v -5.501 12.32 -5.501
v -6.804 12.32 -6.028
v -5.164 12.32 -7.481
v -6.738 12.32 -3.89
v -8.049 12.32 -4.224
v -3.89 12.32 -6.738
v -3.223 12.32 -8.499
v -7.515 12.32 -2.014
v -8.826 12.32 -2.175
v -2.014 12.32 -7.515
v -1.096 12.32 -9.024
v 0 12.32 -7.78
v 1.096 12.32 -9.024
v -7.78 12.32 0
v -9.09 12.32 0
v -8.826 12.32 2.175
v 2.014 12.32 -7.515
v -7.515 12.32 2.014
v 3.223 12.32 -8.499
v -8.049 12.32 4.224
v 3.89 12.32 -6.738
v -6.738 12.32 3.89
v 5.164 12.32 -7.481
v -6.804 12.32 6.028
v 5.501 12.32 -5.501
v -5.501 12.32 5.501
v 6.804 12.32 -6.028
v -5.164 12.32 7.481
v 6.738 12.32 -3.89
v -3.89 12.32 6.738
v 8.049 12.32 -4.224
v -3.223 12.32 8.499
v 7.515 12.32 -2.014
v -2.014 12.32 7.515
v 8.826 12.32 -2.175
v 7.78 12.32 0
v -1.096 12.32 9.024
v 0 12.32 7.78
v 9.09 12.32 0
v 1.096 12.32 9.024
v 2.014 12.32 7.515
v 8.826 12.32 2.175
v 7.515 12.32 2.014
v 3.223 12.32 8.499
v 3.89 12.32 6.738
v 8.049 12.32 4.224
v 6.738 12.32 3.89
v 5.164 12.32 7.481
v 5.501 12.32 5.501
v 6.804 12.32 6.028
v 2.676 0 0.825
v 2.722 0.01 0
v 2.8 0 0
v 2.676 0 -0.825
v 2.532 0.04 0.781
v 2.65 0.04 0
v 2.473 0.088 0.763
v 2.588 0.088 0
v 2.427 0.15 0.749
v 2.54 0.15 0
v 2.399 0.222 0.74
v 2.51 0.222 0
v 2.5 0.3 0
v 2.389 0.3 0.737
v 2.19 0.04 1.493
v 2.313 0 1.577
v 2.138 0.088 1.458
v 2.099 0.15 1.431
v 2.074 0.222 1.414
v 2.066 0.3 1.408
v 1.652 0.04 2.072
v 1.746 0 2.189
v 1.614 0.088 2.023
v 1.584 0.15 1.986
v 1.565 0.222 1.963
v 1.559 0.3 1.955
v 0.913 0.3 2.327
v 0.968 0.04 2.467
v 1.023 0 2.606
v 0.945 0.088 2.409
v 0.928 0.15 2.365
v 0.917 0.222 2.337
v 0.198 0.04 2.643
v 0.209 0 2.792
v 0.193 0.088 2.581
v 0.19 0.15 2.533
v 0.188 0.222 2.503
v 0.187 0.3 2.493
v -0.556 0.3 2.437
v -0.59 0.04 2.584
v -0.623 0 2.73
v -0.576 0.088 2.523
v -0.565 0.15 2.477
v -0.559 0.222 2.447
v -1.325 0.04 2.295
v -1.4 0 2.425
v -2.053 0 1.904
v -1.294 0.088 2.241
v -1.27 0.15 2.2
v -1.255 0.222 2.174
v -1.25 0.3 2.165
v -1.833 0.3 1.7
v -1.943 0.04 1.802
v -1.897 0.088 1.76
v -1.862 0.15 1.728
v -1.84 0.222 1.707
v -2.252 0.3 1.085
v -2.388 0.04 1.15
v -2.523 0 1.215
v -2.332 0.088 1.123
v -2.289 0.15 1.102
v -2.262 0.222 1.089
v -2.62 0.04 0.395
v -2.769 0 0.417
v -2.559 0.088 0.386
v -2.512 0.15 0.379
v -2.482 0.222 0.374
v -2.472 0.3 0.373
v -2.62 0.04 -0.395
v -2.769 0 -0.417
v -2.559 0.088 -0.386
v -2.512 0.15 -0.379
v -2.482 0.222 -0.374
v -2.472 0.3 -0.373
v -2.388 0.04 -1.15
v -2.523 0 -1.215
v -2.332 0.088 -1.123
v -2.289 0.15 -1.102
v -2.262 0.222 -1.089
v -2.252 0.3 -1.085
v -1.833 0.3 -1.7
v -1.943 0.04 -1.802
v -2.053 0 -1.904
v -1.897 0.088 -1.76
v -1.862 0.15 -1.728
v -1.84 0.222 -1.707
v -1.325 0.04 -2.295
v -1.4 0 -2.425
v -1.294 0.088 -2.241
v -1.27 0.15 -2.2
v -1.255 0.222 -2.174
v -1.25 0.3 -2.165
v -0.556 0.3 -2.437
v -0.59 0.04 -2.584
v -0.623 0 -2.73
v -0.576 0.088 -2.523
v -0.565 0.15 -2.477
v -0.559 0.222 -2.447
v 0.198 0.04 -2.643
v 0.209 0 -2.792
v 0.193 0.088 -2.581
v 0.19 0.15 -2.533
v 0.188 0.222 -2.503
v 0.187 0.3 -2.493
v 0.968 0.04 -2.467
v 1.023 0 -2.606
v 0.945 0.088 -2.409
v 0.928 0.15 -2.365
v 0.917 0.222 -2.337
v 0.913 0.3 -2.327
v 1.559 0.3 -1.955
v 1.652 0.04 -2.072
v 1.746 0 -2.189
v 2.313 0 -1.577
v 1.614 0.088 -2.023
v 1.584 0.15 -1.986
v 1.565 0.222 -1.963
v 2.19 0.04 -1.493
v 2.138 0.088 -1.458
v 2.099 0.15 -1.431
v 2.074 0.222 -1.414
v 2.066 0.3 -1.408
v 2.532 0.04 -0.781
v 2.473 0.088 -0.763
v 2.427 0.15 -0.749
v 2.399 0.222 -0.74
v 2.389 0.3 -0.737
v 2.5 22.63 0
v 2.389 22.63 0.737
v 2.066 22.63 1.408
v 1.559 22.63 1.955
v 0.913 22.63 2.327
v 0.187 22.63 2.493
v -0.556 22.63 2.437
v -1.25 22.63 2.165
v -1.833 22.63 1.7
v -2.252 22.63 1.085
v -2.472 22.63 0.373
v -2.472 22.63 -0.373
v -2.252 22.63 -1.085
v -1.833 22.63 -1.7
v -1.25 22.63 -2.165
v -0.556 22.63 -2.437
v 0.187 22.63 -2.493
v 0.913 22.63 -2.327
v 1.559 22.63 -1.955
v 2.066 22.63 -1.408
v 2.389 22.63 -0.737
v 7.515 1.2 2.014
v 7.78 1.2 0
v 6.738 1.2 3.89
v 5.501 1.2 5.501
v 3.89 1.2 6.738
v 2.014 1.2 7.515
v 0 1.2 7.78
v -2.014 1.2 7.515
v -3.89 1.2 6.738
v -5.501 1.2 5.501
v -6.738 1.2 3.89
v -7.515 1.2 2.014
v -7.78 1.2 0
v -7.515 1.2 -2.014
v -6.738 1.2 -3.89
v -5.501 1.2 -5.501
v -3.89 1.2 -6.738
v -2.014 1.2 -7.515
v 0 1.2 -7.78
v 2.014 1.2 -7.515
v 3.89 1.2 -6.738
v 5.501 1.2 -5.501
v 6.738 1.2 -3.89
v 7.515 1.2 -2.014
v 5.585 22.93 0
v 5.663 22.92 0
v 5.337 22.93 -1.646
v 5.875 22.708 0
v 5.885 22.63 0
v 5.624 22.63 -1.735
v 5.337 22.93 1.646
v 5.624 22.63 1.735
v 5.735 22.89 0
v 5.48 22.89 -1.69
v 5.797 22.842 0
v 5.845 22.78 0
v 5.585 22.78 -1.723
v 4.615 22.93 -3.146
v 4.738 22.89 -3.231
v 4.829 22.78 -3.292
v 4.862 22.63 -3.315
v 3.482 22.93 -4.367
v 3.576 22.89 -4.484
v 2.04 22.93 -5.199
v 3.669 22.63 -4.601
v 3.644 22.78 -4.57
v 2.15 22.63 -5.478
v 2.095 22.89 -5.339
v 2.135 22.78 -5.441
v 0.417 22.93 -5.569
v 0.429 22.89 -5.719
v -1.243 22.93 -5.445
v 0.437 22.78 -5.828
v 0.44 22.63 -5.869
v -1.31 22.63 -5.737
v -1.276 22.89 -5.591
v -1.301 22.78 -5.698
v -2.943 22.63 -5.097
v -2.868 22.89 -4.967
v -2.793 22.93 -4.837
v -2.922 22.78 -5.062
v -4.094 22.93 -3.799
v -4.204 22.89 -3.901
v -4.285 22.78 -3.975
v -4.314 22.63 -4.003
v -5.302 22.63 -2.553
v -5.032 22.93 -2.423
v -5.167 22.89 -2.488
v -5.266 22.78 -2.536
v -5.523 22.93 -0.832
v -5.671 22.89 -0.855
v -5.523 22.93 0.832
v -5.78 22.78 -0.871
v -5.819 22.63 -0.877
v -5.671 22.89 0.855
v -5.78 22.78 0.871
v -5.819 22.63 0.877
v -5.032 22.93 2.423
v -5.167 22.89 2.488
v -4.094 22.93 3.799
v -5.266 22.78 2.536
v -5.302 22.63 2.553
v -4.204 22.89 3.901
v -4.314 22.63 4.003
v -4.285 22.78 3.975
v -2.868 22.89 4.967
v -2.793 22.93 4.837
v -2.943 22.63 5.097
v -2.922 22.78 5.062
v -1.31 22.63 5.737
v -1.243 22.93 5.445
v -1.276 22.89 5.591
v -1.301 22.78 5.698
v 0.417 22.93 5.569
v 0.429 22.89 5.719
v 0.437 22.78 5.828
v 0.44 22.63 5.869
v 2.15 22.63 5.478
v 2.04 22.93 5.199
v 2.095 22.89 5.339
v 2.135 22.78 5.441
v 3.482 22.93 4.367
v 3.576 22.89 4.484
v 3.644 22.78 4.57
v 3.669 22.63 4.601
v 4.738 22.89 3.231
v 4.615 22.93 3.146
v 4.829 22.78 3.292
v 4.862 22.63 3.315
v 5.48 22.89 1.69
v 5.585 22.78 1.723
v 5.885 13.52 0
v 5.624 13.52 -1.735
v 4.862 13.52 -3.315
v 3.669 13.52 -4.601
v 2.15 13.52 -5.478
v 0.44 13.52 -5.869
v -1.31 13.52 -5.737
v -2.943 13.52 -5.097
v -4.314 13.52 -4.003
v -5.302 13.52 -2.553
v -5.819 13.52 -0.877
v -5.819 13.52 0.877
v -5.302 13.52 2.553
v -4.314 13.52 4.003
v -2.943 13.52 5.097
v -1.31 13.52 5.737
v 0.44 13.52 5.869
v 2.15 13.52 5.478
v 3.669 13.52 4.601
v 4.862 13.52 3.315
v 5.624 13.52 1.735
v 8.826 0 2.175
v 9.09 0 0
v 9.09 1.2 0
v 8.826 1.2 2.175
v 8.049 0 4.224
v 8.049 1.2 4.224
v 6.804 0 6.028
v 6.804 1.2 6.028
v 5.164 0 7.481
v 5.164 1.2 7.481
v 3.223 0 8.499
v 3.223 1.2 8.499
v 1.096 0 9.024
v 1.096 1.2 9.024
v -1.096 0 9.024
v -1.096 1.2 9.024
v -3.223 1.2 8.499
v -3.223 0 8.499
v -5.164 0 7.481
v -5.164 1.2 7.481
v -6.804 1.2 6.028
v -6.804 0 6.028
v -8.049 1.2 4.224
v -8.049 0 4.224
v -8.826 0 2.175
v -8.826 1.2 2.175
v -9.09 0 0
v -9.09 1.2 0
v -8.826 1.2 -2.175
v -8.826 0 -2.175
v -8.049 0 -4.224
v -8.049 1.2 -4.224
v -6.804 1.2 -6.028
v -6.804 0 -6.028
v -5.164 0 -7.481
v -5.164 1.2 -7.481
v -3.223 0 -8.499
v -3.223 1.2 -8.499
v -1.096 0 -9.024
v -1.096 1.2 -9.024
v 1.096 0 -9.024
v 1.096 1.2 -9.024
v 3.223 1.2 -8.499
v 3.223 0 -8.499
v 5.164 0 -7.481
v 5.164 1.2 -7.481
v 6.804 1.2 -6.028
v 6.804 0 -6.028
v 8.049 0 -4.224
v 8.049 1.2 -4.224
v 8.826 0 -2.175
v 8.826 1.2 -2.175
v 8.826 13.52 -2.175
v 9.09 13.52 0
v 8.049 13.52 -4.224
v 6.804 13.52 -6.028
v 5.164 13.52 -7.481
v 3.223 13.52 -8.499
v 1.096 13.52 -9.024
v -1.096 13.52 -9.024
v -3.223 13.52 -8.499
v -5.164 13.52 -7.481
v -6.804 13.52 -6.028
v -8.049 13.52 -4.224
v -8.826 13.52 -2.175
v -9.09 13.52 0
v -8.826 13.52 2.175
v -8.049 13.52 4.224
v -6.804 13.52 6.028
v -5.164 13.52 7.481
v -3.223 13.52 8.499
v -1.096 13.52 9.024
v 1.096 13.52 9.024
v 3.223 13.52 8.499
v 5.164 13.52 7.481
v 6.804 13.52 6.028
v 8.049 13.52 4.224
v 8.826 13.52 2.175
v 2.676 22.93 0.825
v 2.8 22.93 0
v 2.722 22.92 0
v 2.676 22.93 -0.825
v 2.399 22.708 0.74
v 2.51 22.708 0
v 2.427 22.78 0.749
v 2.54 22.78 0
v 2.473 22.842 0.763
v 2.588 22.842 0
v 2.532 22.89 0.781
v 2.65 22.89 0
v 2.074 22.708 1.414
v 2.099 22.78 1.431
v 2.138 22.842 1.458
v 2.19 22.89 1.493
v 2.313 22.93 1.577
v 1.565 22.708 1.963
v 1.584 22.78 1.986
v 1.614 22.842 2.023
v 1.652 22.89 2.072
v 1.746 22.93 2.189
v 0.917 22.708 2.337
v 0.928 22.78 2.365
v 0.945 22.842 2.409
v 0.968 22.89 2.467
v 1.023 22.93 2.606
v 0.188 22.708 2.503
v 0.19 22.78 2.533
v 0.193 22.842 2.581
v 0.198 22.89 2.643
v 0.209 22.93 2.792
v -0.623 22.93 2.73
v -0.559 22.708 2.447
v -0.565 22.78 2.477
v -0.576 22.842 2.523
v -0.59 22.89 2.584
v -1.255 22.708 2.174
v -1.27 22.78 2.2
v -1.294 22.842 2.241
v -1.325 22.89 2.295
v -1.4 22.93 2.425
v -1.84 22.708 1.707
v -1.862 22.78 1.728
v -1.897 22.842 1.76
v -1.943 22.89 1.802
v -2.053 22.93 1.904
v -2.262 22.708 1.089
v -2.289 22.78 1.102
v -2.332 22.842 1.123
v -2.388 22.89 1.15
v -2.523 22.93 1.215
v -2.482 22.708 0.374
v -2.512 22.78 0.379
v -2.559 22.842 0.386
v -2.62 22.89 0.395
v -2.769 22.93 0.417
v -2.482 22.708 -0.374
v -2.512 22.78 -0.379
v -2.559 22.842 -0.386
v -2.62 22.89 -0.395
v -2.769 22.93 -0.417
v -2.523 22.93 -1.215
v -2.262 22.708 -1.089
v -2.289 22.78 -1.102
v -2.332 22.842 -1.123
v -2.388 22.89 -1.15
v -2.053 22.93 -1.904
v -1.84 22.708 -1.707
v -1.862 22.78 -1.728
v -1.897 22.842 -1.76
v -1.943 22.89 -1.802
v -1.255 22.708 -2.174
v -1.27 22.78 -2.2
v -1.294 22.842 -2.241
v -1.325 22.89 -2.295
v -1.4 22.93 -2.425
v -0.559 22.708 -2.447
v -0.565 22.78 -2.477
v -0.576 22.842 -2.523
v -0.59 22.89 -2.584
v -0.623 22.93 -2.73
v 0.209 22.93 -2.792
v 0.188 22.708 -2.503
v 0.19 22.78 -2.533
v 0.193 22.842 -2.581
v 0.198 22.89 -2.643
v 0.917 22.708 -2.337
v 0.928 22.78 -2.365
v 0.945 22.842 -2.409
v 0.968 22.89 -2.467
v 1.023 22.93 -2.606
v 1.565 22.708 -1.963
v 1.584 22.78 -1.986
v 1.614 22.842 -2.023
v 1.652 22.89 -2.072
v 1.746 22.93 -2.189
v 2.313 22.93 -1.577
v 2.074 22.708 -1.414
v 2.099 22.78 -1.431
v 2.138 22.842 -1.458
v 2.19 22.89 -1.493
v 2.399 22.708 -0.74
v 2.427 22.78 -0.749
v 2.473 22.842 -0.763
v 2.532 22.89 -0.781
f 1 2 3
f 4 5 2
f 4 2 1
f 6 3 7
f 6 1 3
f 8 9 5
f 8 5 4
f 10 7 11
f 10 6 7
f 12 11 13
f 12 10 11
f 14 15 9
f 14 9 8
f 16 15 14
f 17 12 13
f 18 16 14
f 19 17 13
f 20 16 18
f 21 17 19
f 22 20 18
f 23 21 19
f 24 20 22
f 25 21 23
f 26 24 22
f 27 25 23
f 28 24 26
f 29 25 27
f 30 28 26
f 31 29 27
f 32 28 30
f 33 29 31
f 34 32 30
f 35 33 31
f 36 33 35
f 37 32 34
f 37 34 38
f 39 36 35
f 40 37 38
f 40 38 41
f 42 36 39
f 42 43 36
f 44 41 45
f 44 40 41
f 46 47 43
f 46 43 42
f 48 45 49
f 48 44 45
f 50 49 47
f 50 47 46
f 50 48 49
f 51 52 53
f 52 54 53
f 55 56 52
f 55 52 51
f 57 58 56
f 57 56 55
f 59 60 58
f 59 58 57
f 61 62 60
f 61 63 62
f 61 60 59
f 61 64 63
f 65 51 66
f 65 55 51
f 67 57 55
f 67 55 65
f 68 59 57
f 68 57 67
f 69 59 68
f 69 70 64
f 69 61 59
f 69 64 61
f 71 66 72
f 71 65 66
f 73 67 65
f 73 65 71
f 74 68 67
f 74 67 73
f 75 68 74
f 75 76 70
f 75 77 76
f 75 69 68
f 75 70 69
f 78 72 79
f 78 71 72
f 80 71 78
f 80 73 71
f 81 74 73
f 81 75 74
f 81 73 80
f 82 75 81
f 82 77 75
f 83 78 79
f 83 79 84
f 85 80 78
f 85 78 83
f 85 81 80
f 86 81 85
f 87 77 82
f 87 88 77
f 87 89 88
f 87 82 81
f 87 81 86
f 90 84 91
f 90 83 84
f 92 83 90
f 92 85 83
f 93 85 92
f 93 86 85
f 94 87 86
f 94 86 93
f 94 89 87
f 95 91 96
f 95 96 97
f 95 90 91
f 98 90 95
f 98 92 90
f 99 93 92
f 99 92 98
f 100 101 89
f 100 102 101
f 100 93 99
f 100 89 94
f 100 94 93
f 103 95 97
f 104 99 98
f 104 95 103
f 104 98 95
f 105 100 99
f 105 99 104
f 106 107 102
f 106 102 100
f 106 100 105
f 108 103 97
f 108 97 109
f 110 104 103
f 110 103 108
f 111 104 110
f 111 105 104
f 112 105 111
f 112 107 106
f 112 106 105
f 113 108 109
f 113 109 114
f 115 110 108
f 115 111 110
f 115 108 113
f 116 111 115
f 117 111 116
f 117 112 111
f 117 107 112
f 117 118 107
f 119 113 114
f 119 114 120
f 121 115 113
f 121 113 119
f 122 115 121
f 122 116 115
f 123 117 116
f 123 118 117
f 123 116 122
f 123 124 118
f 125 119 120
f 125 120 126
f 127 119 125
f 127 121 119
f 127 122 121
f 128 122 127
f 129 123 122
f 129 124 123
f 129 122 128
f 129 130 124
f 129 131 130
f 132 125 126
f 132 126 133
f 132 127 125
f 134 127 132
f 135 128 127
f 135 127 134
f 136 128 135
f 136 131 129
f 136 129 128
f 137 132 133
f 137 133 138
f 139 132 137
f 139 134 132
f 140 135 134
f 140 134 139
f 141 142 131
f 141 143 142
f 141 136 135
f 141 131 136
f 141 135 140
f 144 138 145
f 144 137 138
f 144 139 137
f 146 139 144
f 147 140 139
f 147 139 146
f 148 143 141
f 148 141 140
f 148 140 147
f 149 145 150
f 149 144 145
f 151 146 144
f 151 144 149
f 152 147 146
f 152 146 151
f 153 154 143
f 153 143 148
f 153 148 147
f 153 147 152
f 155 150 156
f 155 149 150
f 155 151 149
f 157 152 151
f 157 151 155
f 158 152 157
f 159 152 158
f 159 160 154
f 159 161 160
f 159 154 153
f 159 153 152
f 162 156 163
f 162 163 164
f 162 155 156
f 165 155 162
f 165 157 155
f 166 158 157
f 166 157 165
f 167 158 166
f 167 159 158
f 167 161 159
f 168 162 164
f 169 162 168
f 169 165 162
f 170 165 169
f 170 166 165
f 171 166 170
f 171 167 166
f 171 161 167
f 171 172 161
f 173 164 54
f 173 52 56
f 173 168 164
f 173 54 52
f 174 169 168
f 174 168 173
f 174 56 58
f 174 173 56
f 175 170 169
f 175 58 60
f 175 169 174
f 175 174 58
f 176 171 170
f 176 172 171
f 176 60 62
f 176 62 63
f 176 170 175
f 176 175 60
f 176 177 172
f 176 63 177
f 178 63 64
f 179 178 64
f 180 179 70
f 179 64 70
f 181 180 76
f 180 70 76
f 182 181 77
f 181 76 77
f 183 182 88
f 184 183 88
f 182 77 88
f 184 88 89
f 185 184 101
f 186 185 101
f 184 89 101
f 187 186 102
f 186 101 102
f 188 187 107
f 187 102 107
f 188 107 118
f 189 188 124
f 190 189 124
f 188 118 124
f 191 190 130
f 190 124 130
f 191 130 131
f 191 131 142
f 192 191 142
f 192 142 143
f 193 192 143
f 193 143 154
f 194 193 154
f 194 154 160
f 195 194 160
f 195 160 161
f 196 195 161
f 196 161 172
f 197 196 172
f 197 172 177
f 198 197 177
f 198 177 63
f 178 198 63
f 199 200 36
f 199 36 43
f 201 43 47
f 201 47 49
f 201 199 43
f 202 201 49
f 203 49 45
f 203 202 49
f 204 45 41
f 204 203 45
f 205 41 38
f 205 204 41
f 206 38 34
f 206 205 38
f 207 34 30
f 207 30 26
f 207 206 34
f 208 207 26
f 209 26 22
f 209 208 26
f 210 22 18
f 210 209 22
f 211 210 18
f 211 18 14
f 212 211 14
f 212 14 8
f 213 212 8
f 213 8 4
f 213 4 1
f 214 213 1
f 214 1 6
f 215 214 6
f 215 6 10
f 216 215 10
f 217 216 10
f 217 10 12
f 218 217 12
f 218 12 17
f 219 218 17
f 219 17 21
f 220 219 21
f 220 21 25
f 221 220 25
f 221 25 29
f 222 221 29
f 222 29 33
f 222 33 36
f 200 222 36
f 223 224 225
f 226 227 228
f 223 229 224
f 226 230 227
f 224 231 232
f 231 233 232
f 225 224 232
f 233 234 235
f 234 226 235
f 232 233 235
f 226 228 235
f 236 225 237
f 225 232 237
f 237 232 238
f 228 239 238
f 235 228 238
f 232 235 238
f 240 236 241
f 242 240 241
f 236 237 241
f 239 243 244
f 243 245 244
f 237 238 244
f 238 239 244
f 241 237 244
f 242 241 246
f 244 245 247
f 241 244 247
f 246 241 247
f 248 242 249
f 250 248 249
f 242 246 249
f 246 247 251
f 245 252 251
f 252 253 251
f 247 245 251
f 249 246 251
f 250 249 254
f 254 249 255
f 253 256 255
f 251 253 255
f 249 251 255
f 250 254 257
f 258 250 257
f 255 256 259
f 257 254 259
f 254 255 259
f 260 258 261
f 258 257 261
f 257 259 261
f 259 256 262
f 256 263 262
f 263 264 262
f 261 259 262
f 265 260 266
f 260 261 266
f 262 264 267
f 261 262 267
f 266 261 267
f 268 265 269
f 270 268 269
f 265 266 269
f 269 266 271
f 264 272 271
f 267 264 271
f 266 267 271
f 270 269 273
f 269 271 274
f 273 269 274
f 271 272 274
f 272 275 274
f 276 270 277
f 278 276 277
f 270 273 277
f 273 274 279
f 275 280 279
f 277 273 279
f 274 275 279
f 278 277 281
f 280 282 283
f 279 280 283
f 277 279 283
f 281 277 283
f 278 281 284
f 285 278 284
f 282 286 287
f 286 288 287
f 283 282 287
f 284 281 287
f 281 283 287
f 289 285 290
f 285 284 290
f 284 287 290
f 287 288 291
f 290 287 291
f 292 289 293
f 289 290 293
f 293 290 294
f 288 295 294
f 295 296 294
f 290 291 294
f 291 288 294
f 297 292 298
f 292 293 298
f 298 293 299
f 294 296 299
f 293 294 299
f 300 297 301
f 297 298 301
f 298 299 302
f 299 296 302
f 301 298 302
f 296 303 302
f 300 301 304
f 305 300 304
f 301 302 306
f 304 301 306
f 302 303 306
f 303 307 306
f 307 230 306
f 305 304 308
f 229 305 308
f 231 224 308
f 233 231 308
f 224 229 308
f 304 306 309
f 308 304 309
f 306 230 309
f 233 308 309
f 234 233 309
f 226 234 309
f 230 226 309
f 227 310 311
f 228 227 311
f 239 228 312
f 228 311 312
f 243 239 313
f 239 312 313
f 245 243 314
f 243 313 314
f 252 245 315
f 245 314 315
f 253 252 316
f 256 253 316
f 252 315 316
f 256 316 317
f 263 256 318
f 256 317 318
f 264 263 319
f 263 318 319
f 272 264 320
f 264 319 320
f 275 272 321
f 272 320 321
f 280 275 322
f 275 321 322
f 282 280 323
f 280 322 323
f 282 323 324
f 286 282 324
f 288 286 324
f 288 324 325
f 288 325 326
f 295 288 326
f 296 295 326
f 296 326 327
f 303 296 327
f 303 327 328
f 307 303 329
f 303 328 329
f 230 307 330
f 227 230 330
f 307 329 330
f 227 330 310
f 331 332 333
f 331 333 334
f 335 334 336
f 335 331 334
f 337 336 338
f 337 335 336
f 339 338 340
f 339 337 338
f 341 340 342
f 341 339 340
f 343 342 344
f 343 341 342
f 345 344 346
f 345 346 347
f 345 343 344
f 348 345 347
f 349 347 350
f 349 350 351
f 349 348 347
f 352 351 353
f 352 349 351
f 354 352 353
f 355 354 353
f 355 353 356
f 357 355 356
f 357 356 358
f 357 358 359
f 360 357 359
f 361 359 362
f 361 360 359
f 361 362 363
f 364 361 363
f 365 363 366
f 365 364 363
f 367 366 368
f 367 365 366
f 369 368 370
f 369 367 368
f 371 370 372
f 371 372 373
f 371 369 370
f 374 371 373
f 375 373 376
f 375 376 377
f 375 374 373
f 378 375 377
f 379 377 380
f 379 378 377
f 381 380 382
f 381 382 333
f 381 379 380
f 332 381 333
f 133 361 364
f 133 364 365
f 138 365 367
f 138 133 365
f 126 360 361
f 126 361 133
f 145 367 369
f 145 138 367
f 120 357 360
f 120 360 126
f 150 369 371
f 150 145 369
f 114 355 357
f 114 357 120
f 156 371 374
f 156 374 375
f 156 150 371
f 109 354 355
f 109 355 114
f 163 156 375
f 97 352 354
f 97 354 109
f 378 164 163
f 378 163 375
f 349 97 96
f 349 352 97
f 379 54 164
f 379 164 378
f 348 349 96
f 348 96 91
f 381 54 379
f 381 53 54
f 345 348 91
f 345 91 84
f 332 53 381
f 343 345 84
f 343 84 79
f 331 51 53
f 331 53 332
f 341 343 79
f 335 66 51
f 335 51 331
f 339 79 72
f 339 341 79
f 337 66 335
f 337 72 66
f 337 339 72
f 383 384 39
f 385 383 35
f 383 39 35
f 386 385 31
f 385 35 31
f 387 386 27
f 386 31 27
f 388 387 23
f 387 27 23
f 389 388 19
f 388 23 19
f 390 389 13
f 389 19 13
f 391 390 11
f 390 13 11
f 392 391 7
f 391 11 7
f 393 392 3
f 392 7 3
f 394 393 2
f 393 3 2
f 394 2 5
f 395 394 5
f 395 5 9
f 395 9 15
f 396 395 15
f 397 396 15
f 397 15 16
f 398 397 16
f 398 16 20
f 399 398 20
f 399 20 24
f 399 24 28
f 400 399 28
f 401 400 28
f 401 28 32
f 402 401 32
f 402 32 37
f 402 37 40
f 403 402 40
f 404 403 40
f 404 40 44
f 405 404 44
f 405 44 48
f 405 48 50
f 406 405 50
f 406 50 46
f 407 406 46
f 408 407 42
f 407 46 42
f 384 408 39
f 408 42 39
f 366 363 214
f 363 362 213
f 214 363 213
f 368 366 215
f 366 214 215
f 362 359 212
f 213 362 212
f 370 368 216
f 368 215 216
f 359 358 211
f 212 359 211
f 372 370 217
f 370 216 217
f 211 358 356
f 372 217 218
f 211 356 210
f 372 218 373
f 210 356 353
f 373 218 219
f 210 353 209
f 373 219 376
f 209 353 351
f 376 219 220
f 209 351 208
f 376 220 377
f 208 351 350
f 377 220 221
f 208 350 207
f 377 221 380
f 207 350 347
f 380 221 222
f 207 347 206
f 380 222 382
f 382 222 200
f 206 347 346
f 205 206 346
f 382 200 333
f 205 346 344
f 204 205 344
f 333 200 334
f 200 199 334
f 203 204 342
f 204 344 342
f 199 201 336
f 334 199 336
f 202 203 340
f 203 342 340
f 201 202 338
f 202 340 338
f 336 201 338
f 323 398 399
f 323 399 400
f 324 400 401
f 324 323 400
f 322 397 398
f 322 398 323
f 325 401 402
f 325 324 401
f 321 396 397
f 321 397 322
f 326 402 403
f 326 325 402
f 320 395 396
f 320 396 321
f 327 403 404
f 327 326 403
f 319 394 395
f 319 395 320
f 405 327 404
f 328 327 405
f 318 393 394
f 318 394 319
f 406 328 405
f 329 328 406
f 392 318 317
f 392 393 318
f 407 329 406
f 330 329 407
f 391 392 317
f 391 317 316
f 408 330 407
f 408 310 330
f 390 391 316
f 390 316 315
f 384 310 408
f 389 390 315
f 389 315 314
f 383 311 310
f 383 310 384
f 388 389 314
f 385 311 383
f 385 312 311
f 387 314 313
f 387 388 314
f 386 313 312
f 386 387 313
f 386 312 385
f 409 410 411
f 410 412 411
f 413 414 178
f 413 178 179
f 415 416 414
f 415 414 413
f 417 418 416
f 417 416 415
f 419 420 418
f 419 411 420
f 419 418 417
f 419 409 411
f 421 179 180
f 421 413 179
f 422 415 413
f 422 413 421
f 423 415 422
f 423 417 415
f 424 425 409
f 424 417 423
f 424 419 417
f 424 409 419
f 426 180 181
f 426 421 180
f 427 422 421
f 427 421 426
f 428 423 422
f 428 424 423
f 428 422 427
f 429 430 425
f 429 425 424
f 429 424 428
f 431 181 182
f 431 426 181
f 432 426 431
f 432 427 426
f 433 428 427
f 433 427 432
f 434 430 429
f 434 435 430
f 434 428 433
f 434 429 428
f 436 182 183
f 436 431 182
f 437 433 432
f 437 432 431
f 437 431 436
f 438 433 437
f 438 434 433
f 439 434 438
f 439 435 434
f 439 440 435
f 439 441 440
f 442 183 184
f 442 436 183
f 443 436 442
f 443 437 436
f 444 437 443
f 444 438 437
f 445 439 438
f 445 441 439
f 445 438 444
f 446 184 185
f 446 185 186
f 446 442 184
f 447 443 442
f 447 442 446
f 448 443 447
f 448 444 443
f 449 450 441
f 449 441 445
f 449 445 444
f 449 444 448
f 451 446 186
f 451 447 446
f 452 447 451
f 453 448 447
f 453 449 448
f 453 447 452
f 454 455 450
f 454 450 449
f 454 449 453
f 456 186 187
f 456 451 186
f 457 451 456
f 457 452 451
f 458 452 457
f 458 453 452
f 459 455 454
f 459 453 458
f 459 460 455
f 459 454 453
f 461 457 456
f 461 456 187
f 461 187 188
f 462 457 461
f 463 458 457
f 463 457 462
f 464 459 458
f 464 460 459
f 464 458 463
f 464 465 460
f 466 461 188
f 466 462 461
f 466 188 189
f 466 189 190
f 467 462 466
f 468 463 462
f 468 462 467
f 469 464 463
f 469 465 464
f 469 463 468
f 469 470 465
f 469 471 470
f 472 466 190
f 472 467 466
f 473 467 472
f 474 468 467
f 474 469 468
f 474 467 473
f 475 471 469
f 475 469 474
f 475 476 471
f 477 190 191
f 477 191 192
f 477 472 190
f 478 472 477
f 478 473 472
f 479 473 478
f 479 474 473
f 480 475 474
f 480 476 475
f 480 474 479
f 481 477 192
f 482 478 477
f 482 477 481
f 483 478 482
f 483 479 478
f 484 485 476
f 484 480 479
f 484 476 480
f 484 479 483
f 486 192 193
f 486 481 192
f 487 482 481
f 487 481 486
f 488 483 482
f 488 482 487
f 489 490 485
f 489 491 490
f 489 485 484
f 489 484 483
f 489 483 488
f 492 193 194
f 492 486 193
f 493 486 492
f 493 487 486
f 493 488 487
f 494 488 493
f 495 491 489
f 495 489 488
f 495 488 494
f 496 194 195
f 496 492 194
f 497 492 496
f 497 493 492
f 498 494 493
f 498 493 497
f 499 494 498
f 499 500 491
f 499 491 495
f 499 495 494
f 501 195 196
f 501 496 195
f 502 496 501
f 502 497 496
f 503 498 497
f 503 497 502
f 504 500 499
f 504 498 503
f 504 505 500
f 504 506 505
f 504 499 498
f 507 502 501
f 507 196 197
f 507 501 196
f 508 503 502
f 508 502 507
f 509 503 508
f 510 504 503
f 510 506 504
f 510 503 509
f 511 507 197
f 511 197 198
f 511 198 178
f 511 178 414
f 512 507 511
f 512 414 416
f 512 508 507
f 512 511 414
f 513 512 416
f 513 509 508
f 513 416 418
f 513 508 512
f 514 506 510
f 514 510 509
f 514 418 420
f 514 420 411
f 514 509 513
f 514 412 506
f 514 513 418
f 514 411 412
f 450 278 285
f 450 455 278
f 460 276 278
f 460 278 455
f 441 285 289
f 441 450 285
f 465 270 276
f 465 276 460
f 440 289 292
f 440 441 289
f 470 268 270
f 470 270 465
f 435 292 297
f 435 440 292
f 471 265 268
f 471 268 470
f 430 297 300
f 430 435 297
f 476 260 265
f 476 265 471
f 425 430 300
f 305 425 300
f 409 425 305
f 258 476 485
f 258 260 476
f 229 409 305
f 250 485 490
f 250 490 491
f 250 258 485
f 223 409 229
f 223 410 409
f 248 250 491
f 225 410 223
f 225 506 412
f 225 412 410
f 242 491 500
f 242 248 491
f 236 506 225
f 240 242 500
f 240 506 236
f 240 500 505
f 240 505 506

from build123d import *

# Parameters (mm, degrees)
SKETCH1_R           = 9.09
BOSS_EXTRUDE1_DEPTH = 13.52
SKETCH2_R           = 5.885
BOSS_EXTRUDE2_DEPTH = 9.41
SKETCH3_OUTSIDE_W   = 27.07
SKETCH3_OUTSIDE_H   = 27.07
SKETCH3_OUTSIDE_R   = 7.78
CUT_EXTRUDE1_DEPTH  = 12.32
SKETCH4_R           = 9.09
BOSS_EXTRUDE3_DEPTH = 1.2
SKETCH5_R           = 2.5
CUT_EXTRUDE2_DEPTH  = 23.93
FILLET3_R           = 0.3


with BuildPart() as part:
    # Sketch1 → Boss-Extrude1 (new body)
    with BuildSketch(Plane(origin=(0, 0, 0), x_dir=(1, 0, 0), z_dir=(0, 1, 0))):
        Circle(SKETCH1_R)
    extrude(amount=BOSS_EXTRUDE1_DEPTH)

    # Sketch2 → Boss-Extrude2 (add)
    with BuildSketch(Plane(origin=(0, 13.52, 0), x_dir=(1, 0, 0), z_dir=(0, 1, 0))):
        Circle(SKETCH2_R)
    extrude(amount=BOSS_EXTRUDE2_DEPTH)

    # Sketch3 outside → Cut-Extrude1 (cut)
    with BuildSketch(Plane.XZ):
        Rectangle(SKETCH3_OUTSIDE_W, SKETCH3_OUTSIDE_H)
        Circle(SKETCH3_OUTSIDE_R, mode=Mode.SUBTRACT)
    extrude(amount=-CUT_EXTRUDE1_DEPTH, mode=Mode.SUBTRACT)

    # Sketch4 → Boss-Extrude3 (add)
    with BuildSketch(Plane.XZ):
        Circle(SKETCH4_R)
    extrude(amount=-BOSS_EXTRUDE3_DEPTH)

    # Sketch5 → Cut-Extrude2 (cut, through all)
    with BuildSketch(Plane.XZ):
        Circle(SKETCH5_R)
    extrude(amount=-CUT_EXTRUDE2_DEPTH, mode=Mode.SUBTRACT)

    # Fillet3
    fillet3_edges = [part.edges().sort_by_distance(p)[0] for p in [
        (-2.5, 22.93, 0),
        (-2.5, 0, 0),
        (-5.885, 22.93, 0),
    ]]
    fillet(fillet3_edges, radius=FILLET3_R)


solid = part.part
